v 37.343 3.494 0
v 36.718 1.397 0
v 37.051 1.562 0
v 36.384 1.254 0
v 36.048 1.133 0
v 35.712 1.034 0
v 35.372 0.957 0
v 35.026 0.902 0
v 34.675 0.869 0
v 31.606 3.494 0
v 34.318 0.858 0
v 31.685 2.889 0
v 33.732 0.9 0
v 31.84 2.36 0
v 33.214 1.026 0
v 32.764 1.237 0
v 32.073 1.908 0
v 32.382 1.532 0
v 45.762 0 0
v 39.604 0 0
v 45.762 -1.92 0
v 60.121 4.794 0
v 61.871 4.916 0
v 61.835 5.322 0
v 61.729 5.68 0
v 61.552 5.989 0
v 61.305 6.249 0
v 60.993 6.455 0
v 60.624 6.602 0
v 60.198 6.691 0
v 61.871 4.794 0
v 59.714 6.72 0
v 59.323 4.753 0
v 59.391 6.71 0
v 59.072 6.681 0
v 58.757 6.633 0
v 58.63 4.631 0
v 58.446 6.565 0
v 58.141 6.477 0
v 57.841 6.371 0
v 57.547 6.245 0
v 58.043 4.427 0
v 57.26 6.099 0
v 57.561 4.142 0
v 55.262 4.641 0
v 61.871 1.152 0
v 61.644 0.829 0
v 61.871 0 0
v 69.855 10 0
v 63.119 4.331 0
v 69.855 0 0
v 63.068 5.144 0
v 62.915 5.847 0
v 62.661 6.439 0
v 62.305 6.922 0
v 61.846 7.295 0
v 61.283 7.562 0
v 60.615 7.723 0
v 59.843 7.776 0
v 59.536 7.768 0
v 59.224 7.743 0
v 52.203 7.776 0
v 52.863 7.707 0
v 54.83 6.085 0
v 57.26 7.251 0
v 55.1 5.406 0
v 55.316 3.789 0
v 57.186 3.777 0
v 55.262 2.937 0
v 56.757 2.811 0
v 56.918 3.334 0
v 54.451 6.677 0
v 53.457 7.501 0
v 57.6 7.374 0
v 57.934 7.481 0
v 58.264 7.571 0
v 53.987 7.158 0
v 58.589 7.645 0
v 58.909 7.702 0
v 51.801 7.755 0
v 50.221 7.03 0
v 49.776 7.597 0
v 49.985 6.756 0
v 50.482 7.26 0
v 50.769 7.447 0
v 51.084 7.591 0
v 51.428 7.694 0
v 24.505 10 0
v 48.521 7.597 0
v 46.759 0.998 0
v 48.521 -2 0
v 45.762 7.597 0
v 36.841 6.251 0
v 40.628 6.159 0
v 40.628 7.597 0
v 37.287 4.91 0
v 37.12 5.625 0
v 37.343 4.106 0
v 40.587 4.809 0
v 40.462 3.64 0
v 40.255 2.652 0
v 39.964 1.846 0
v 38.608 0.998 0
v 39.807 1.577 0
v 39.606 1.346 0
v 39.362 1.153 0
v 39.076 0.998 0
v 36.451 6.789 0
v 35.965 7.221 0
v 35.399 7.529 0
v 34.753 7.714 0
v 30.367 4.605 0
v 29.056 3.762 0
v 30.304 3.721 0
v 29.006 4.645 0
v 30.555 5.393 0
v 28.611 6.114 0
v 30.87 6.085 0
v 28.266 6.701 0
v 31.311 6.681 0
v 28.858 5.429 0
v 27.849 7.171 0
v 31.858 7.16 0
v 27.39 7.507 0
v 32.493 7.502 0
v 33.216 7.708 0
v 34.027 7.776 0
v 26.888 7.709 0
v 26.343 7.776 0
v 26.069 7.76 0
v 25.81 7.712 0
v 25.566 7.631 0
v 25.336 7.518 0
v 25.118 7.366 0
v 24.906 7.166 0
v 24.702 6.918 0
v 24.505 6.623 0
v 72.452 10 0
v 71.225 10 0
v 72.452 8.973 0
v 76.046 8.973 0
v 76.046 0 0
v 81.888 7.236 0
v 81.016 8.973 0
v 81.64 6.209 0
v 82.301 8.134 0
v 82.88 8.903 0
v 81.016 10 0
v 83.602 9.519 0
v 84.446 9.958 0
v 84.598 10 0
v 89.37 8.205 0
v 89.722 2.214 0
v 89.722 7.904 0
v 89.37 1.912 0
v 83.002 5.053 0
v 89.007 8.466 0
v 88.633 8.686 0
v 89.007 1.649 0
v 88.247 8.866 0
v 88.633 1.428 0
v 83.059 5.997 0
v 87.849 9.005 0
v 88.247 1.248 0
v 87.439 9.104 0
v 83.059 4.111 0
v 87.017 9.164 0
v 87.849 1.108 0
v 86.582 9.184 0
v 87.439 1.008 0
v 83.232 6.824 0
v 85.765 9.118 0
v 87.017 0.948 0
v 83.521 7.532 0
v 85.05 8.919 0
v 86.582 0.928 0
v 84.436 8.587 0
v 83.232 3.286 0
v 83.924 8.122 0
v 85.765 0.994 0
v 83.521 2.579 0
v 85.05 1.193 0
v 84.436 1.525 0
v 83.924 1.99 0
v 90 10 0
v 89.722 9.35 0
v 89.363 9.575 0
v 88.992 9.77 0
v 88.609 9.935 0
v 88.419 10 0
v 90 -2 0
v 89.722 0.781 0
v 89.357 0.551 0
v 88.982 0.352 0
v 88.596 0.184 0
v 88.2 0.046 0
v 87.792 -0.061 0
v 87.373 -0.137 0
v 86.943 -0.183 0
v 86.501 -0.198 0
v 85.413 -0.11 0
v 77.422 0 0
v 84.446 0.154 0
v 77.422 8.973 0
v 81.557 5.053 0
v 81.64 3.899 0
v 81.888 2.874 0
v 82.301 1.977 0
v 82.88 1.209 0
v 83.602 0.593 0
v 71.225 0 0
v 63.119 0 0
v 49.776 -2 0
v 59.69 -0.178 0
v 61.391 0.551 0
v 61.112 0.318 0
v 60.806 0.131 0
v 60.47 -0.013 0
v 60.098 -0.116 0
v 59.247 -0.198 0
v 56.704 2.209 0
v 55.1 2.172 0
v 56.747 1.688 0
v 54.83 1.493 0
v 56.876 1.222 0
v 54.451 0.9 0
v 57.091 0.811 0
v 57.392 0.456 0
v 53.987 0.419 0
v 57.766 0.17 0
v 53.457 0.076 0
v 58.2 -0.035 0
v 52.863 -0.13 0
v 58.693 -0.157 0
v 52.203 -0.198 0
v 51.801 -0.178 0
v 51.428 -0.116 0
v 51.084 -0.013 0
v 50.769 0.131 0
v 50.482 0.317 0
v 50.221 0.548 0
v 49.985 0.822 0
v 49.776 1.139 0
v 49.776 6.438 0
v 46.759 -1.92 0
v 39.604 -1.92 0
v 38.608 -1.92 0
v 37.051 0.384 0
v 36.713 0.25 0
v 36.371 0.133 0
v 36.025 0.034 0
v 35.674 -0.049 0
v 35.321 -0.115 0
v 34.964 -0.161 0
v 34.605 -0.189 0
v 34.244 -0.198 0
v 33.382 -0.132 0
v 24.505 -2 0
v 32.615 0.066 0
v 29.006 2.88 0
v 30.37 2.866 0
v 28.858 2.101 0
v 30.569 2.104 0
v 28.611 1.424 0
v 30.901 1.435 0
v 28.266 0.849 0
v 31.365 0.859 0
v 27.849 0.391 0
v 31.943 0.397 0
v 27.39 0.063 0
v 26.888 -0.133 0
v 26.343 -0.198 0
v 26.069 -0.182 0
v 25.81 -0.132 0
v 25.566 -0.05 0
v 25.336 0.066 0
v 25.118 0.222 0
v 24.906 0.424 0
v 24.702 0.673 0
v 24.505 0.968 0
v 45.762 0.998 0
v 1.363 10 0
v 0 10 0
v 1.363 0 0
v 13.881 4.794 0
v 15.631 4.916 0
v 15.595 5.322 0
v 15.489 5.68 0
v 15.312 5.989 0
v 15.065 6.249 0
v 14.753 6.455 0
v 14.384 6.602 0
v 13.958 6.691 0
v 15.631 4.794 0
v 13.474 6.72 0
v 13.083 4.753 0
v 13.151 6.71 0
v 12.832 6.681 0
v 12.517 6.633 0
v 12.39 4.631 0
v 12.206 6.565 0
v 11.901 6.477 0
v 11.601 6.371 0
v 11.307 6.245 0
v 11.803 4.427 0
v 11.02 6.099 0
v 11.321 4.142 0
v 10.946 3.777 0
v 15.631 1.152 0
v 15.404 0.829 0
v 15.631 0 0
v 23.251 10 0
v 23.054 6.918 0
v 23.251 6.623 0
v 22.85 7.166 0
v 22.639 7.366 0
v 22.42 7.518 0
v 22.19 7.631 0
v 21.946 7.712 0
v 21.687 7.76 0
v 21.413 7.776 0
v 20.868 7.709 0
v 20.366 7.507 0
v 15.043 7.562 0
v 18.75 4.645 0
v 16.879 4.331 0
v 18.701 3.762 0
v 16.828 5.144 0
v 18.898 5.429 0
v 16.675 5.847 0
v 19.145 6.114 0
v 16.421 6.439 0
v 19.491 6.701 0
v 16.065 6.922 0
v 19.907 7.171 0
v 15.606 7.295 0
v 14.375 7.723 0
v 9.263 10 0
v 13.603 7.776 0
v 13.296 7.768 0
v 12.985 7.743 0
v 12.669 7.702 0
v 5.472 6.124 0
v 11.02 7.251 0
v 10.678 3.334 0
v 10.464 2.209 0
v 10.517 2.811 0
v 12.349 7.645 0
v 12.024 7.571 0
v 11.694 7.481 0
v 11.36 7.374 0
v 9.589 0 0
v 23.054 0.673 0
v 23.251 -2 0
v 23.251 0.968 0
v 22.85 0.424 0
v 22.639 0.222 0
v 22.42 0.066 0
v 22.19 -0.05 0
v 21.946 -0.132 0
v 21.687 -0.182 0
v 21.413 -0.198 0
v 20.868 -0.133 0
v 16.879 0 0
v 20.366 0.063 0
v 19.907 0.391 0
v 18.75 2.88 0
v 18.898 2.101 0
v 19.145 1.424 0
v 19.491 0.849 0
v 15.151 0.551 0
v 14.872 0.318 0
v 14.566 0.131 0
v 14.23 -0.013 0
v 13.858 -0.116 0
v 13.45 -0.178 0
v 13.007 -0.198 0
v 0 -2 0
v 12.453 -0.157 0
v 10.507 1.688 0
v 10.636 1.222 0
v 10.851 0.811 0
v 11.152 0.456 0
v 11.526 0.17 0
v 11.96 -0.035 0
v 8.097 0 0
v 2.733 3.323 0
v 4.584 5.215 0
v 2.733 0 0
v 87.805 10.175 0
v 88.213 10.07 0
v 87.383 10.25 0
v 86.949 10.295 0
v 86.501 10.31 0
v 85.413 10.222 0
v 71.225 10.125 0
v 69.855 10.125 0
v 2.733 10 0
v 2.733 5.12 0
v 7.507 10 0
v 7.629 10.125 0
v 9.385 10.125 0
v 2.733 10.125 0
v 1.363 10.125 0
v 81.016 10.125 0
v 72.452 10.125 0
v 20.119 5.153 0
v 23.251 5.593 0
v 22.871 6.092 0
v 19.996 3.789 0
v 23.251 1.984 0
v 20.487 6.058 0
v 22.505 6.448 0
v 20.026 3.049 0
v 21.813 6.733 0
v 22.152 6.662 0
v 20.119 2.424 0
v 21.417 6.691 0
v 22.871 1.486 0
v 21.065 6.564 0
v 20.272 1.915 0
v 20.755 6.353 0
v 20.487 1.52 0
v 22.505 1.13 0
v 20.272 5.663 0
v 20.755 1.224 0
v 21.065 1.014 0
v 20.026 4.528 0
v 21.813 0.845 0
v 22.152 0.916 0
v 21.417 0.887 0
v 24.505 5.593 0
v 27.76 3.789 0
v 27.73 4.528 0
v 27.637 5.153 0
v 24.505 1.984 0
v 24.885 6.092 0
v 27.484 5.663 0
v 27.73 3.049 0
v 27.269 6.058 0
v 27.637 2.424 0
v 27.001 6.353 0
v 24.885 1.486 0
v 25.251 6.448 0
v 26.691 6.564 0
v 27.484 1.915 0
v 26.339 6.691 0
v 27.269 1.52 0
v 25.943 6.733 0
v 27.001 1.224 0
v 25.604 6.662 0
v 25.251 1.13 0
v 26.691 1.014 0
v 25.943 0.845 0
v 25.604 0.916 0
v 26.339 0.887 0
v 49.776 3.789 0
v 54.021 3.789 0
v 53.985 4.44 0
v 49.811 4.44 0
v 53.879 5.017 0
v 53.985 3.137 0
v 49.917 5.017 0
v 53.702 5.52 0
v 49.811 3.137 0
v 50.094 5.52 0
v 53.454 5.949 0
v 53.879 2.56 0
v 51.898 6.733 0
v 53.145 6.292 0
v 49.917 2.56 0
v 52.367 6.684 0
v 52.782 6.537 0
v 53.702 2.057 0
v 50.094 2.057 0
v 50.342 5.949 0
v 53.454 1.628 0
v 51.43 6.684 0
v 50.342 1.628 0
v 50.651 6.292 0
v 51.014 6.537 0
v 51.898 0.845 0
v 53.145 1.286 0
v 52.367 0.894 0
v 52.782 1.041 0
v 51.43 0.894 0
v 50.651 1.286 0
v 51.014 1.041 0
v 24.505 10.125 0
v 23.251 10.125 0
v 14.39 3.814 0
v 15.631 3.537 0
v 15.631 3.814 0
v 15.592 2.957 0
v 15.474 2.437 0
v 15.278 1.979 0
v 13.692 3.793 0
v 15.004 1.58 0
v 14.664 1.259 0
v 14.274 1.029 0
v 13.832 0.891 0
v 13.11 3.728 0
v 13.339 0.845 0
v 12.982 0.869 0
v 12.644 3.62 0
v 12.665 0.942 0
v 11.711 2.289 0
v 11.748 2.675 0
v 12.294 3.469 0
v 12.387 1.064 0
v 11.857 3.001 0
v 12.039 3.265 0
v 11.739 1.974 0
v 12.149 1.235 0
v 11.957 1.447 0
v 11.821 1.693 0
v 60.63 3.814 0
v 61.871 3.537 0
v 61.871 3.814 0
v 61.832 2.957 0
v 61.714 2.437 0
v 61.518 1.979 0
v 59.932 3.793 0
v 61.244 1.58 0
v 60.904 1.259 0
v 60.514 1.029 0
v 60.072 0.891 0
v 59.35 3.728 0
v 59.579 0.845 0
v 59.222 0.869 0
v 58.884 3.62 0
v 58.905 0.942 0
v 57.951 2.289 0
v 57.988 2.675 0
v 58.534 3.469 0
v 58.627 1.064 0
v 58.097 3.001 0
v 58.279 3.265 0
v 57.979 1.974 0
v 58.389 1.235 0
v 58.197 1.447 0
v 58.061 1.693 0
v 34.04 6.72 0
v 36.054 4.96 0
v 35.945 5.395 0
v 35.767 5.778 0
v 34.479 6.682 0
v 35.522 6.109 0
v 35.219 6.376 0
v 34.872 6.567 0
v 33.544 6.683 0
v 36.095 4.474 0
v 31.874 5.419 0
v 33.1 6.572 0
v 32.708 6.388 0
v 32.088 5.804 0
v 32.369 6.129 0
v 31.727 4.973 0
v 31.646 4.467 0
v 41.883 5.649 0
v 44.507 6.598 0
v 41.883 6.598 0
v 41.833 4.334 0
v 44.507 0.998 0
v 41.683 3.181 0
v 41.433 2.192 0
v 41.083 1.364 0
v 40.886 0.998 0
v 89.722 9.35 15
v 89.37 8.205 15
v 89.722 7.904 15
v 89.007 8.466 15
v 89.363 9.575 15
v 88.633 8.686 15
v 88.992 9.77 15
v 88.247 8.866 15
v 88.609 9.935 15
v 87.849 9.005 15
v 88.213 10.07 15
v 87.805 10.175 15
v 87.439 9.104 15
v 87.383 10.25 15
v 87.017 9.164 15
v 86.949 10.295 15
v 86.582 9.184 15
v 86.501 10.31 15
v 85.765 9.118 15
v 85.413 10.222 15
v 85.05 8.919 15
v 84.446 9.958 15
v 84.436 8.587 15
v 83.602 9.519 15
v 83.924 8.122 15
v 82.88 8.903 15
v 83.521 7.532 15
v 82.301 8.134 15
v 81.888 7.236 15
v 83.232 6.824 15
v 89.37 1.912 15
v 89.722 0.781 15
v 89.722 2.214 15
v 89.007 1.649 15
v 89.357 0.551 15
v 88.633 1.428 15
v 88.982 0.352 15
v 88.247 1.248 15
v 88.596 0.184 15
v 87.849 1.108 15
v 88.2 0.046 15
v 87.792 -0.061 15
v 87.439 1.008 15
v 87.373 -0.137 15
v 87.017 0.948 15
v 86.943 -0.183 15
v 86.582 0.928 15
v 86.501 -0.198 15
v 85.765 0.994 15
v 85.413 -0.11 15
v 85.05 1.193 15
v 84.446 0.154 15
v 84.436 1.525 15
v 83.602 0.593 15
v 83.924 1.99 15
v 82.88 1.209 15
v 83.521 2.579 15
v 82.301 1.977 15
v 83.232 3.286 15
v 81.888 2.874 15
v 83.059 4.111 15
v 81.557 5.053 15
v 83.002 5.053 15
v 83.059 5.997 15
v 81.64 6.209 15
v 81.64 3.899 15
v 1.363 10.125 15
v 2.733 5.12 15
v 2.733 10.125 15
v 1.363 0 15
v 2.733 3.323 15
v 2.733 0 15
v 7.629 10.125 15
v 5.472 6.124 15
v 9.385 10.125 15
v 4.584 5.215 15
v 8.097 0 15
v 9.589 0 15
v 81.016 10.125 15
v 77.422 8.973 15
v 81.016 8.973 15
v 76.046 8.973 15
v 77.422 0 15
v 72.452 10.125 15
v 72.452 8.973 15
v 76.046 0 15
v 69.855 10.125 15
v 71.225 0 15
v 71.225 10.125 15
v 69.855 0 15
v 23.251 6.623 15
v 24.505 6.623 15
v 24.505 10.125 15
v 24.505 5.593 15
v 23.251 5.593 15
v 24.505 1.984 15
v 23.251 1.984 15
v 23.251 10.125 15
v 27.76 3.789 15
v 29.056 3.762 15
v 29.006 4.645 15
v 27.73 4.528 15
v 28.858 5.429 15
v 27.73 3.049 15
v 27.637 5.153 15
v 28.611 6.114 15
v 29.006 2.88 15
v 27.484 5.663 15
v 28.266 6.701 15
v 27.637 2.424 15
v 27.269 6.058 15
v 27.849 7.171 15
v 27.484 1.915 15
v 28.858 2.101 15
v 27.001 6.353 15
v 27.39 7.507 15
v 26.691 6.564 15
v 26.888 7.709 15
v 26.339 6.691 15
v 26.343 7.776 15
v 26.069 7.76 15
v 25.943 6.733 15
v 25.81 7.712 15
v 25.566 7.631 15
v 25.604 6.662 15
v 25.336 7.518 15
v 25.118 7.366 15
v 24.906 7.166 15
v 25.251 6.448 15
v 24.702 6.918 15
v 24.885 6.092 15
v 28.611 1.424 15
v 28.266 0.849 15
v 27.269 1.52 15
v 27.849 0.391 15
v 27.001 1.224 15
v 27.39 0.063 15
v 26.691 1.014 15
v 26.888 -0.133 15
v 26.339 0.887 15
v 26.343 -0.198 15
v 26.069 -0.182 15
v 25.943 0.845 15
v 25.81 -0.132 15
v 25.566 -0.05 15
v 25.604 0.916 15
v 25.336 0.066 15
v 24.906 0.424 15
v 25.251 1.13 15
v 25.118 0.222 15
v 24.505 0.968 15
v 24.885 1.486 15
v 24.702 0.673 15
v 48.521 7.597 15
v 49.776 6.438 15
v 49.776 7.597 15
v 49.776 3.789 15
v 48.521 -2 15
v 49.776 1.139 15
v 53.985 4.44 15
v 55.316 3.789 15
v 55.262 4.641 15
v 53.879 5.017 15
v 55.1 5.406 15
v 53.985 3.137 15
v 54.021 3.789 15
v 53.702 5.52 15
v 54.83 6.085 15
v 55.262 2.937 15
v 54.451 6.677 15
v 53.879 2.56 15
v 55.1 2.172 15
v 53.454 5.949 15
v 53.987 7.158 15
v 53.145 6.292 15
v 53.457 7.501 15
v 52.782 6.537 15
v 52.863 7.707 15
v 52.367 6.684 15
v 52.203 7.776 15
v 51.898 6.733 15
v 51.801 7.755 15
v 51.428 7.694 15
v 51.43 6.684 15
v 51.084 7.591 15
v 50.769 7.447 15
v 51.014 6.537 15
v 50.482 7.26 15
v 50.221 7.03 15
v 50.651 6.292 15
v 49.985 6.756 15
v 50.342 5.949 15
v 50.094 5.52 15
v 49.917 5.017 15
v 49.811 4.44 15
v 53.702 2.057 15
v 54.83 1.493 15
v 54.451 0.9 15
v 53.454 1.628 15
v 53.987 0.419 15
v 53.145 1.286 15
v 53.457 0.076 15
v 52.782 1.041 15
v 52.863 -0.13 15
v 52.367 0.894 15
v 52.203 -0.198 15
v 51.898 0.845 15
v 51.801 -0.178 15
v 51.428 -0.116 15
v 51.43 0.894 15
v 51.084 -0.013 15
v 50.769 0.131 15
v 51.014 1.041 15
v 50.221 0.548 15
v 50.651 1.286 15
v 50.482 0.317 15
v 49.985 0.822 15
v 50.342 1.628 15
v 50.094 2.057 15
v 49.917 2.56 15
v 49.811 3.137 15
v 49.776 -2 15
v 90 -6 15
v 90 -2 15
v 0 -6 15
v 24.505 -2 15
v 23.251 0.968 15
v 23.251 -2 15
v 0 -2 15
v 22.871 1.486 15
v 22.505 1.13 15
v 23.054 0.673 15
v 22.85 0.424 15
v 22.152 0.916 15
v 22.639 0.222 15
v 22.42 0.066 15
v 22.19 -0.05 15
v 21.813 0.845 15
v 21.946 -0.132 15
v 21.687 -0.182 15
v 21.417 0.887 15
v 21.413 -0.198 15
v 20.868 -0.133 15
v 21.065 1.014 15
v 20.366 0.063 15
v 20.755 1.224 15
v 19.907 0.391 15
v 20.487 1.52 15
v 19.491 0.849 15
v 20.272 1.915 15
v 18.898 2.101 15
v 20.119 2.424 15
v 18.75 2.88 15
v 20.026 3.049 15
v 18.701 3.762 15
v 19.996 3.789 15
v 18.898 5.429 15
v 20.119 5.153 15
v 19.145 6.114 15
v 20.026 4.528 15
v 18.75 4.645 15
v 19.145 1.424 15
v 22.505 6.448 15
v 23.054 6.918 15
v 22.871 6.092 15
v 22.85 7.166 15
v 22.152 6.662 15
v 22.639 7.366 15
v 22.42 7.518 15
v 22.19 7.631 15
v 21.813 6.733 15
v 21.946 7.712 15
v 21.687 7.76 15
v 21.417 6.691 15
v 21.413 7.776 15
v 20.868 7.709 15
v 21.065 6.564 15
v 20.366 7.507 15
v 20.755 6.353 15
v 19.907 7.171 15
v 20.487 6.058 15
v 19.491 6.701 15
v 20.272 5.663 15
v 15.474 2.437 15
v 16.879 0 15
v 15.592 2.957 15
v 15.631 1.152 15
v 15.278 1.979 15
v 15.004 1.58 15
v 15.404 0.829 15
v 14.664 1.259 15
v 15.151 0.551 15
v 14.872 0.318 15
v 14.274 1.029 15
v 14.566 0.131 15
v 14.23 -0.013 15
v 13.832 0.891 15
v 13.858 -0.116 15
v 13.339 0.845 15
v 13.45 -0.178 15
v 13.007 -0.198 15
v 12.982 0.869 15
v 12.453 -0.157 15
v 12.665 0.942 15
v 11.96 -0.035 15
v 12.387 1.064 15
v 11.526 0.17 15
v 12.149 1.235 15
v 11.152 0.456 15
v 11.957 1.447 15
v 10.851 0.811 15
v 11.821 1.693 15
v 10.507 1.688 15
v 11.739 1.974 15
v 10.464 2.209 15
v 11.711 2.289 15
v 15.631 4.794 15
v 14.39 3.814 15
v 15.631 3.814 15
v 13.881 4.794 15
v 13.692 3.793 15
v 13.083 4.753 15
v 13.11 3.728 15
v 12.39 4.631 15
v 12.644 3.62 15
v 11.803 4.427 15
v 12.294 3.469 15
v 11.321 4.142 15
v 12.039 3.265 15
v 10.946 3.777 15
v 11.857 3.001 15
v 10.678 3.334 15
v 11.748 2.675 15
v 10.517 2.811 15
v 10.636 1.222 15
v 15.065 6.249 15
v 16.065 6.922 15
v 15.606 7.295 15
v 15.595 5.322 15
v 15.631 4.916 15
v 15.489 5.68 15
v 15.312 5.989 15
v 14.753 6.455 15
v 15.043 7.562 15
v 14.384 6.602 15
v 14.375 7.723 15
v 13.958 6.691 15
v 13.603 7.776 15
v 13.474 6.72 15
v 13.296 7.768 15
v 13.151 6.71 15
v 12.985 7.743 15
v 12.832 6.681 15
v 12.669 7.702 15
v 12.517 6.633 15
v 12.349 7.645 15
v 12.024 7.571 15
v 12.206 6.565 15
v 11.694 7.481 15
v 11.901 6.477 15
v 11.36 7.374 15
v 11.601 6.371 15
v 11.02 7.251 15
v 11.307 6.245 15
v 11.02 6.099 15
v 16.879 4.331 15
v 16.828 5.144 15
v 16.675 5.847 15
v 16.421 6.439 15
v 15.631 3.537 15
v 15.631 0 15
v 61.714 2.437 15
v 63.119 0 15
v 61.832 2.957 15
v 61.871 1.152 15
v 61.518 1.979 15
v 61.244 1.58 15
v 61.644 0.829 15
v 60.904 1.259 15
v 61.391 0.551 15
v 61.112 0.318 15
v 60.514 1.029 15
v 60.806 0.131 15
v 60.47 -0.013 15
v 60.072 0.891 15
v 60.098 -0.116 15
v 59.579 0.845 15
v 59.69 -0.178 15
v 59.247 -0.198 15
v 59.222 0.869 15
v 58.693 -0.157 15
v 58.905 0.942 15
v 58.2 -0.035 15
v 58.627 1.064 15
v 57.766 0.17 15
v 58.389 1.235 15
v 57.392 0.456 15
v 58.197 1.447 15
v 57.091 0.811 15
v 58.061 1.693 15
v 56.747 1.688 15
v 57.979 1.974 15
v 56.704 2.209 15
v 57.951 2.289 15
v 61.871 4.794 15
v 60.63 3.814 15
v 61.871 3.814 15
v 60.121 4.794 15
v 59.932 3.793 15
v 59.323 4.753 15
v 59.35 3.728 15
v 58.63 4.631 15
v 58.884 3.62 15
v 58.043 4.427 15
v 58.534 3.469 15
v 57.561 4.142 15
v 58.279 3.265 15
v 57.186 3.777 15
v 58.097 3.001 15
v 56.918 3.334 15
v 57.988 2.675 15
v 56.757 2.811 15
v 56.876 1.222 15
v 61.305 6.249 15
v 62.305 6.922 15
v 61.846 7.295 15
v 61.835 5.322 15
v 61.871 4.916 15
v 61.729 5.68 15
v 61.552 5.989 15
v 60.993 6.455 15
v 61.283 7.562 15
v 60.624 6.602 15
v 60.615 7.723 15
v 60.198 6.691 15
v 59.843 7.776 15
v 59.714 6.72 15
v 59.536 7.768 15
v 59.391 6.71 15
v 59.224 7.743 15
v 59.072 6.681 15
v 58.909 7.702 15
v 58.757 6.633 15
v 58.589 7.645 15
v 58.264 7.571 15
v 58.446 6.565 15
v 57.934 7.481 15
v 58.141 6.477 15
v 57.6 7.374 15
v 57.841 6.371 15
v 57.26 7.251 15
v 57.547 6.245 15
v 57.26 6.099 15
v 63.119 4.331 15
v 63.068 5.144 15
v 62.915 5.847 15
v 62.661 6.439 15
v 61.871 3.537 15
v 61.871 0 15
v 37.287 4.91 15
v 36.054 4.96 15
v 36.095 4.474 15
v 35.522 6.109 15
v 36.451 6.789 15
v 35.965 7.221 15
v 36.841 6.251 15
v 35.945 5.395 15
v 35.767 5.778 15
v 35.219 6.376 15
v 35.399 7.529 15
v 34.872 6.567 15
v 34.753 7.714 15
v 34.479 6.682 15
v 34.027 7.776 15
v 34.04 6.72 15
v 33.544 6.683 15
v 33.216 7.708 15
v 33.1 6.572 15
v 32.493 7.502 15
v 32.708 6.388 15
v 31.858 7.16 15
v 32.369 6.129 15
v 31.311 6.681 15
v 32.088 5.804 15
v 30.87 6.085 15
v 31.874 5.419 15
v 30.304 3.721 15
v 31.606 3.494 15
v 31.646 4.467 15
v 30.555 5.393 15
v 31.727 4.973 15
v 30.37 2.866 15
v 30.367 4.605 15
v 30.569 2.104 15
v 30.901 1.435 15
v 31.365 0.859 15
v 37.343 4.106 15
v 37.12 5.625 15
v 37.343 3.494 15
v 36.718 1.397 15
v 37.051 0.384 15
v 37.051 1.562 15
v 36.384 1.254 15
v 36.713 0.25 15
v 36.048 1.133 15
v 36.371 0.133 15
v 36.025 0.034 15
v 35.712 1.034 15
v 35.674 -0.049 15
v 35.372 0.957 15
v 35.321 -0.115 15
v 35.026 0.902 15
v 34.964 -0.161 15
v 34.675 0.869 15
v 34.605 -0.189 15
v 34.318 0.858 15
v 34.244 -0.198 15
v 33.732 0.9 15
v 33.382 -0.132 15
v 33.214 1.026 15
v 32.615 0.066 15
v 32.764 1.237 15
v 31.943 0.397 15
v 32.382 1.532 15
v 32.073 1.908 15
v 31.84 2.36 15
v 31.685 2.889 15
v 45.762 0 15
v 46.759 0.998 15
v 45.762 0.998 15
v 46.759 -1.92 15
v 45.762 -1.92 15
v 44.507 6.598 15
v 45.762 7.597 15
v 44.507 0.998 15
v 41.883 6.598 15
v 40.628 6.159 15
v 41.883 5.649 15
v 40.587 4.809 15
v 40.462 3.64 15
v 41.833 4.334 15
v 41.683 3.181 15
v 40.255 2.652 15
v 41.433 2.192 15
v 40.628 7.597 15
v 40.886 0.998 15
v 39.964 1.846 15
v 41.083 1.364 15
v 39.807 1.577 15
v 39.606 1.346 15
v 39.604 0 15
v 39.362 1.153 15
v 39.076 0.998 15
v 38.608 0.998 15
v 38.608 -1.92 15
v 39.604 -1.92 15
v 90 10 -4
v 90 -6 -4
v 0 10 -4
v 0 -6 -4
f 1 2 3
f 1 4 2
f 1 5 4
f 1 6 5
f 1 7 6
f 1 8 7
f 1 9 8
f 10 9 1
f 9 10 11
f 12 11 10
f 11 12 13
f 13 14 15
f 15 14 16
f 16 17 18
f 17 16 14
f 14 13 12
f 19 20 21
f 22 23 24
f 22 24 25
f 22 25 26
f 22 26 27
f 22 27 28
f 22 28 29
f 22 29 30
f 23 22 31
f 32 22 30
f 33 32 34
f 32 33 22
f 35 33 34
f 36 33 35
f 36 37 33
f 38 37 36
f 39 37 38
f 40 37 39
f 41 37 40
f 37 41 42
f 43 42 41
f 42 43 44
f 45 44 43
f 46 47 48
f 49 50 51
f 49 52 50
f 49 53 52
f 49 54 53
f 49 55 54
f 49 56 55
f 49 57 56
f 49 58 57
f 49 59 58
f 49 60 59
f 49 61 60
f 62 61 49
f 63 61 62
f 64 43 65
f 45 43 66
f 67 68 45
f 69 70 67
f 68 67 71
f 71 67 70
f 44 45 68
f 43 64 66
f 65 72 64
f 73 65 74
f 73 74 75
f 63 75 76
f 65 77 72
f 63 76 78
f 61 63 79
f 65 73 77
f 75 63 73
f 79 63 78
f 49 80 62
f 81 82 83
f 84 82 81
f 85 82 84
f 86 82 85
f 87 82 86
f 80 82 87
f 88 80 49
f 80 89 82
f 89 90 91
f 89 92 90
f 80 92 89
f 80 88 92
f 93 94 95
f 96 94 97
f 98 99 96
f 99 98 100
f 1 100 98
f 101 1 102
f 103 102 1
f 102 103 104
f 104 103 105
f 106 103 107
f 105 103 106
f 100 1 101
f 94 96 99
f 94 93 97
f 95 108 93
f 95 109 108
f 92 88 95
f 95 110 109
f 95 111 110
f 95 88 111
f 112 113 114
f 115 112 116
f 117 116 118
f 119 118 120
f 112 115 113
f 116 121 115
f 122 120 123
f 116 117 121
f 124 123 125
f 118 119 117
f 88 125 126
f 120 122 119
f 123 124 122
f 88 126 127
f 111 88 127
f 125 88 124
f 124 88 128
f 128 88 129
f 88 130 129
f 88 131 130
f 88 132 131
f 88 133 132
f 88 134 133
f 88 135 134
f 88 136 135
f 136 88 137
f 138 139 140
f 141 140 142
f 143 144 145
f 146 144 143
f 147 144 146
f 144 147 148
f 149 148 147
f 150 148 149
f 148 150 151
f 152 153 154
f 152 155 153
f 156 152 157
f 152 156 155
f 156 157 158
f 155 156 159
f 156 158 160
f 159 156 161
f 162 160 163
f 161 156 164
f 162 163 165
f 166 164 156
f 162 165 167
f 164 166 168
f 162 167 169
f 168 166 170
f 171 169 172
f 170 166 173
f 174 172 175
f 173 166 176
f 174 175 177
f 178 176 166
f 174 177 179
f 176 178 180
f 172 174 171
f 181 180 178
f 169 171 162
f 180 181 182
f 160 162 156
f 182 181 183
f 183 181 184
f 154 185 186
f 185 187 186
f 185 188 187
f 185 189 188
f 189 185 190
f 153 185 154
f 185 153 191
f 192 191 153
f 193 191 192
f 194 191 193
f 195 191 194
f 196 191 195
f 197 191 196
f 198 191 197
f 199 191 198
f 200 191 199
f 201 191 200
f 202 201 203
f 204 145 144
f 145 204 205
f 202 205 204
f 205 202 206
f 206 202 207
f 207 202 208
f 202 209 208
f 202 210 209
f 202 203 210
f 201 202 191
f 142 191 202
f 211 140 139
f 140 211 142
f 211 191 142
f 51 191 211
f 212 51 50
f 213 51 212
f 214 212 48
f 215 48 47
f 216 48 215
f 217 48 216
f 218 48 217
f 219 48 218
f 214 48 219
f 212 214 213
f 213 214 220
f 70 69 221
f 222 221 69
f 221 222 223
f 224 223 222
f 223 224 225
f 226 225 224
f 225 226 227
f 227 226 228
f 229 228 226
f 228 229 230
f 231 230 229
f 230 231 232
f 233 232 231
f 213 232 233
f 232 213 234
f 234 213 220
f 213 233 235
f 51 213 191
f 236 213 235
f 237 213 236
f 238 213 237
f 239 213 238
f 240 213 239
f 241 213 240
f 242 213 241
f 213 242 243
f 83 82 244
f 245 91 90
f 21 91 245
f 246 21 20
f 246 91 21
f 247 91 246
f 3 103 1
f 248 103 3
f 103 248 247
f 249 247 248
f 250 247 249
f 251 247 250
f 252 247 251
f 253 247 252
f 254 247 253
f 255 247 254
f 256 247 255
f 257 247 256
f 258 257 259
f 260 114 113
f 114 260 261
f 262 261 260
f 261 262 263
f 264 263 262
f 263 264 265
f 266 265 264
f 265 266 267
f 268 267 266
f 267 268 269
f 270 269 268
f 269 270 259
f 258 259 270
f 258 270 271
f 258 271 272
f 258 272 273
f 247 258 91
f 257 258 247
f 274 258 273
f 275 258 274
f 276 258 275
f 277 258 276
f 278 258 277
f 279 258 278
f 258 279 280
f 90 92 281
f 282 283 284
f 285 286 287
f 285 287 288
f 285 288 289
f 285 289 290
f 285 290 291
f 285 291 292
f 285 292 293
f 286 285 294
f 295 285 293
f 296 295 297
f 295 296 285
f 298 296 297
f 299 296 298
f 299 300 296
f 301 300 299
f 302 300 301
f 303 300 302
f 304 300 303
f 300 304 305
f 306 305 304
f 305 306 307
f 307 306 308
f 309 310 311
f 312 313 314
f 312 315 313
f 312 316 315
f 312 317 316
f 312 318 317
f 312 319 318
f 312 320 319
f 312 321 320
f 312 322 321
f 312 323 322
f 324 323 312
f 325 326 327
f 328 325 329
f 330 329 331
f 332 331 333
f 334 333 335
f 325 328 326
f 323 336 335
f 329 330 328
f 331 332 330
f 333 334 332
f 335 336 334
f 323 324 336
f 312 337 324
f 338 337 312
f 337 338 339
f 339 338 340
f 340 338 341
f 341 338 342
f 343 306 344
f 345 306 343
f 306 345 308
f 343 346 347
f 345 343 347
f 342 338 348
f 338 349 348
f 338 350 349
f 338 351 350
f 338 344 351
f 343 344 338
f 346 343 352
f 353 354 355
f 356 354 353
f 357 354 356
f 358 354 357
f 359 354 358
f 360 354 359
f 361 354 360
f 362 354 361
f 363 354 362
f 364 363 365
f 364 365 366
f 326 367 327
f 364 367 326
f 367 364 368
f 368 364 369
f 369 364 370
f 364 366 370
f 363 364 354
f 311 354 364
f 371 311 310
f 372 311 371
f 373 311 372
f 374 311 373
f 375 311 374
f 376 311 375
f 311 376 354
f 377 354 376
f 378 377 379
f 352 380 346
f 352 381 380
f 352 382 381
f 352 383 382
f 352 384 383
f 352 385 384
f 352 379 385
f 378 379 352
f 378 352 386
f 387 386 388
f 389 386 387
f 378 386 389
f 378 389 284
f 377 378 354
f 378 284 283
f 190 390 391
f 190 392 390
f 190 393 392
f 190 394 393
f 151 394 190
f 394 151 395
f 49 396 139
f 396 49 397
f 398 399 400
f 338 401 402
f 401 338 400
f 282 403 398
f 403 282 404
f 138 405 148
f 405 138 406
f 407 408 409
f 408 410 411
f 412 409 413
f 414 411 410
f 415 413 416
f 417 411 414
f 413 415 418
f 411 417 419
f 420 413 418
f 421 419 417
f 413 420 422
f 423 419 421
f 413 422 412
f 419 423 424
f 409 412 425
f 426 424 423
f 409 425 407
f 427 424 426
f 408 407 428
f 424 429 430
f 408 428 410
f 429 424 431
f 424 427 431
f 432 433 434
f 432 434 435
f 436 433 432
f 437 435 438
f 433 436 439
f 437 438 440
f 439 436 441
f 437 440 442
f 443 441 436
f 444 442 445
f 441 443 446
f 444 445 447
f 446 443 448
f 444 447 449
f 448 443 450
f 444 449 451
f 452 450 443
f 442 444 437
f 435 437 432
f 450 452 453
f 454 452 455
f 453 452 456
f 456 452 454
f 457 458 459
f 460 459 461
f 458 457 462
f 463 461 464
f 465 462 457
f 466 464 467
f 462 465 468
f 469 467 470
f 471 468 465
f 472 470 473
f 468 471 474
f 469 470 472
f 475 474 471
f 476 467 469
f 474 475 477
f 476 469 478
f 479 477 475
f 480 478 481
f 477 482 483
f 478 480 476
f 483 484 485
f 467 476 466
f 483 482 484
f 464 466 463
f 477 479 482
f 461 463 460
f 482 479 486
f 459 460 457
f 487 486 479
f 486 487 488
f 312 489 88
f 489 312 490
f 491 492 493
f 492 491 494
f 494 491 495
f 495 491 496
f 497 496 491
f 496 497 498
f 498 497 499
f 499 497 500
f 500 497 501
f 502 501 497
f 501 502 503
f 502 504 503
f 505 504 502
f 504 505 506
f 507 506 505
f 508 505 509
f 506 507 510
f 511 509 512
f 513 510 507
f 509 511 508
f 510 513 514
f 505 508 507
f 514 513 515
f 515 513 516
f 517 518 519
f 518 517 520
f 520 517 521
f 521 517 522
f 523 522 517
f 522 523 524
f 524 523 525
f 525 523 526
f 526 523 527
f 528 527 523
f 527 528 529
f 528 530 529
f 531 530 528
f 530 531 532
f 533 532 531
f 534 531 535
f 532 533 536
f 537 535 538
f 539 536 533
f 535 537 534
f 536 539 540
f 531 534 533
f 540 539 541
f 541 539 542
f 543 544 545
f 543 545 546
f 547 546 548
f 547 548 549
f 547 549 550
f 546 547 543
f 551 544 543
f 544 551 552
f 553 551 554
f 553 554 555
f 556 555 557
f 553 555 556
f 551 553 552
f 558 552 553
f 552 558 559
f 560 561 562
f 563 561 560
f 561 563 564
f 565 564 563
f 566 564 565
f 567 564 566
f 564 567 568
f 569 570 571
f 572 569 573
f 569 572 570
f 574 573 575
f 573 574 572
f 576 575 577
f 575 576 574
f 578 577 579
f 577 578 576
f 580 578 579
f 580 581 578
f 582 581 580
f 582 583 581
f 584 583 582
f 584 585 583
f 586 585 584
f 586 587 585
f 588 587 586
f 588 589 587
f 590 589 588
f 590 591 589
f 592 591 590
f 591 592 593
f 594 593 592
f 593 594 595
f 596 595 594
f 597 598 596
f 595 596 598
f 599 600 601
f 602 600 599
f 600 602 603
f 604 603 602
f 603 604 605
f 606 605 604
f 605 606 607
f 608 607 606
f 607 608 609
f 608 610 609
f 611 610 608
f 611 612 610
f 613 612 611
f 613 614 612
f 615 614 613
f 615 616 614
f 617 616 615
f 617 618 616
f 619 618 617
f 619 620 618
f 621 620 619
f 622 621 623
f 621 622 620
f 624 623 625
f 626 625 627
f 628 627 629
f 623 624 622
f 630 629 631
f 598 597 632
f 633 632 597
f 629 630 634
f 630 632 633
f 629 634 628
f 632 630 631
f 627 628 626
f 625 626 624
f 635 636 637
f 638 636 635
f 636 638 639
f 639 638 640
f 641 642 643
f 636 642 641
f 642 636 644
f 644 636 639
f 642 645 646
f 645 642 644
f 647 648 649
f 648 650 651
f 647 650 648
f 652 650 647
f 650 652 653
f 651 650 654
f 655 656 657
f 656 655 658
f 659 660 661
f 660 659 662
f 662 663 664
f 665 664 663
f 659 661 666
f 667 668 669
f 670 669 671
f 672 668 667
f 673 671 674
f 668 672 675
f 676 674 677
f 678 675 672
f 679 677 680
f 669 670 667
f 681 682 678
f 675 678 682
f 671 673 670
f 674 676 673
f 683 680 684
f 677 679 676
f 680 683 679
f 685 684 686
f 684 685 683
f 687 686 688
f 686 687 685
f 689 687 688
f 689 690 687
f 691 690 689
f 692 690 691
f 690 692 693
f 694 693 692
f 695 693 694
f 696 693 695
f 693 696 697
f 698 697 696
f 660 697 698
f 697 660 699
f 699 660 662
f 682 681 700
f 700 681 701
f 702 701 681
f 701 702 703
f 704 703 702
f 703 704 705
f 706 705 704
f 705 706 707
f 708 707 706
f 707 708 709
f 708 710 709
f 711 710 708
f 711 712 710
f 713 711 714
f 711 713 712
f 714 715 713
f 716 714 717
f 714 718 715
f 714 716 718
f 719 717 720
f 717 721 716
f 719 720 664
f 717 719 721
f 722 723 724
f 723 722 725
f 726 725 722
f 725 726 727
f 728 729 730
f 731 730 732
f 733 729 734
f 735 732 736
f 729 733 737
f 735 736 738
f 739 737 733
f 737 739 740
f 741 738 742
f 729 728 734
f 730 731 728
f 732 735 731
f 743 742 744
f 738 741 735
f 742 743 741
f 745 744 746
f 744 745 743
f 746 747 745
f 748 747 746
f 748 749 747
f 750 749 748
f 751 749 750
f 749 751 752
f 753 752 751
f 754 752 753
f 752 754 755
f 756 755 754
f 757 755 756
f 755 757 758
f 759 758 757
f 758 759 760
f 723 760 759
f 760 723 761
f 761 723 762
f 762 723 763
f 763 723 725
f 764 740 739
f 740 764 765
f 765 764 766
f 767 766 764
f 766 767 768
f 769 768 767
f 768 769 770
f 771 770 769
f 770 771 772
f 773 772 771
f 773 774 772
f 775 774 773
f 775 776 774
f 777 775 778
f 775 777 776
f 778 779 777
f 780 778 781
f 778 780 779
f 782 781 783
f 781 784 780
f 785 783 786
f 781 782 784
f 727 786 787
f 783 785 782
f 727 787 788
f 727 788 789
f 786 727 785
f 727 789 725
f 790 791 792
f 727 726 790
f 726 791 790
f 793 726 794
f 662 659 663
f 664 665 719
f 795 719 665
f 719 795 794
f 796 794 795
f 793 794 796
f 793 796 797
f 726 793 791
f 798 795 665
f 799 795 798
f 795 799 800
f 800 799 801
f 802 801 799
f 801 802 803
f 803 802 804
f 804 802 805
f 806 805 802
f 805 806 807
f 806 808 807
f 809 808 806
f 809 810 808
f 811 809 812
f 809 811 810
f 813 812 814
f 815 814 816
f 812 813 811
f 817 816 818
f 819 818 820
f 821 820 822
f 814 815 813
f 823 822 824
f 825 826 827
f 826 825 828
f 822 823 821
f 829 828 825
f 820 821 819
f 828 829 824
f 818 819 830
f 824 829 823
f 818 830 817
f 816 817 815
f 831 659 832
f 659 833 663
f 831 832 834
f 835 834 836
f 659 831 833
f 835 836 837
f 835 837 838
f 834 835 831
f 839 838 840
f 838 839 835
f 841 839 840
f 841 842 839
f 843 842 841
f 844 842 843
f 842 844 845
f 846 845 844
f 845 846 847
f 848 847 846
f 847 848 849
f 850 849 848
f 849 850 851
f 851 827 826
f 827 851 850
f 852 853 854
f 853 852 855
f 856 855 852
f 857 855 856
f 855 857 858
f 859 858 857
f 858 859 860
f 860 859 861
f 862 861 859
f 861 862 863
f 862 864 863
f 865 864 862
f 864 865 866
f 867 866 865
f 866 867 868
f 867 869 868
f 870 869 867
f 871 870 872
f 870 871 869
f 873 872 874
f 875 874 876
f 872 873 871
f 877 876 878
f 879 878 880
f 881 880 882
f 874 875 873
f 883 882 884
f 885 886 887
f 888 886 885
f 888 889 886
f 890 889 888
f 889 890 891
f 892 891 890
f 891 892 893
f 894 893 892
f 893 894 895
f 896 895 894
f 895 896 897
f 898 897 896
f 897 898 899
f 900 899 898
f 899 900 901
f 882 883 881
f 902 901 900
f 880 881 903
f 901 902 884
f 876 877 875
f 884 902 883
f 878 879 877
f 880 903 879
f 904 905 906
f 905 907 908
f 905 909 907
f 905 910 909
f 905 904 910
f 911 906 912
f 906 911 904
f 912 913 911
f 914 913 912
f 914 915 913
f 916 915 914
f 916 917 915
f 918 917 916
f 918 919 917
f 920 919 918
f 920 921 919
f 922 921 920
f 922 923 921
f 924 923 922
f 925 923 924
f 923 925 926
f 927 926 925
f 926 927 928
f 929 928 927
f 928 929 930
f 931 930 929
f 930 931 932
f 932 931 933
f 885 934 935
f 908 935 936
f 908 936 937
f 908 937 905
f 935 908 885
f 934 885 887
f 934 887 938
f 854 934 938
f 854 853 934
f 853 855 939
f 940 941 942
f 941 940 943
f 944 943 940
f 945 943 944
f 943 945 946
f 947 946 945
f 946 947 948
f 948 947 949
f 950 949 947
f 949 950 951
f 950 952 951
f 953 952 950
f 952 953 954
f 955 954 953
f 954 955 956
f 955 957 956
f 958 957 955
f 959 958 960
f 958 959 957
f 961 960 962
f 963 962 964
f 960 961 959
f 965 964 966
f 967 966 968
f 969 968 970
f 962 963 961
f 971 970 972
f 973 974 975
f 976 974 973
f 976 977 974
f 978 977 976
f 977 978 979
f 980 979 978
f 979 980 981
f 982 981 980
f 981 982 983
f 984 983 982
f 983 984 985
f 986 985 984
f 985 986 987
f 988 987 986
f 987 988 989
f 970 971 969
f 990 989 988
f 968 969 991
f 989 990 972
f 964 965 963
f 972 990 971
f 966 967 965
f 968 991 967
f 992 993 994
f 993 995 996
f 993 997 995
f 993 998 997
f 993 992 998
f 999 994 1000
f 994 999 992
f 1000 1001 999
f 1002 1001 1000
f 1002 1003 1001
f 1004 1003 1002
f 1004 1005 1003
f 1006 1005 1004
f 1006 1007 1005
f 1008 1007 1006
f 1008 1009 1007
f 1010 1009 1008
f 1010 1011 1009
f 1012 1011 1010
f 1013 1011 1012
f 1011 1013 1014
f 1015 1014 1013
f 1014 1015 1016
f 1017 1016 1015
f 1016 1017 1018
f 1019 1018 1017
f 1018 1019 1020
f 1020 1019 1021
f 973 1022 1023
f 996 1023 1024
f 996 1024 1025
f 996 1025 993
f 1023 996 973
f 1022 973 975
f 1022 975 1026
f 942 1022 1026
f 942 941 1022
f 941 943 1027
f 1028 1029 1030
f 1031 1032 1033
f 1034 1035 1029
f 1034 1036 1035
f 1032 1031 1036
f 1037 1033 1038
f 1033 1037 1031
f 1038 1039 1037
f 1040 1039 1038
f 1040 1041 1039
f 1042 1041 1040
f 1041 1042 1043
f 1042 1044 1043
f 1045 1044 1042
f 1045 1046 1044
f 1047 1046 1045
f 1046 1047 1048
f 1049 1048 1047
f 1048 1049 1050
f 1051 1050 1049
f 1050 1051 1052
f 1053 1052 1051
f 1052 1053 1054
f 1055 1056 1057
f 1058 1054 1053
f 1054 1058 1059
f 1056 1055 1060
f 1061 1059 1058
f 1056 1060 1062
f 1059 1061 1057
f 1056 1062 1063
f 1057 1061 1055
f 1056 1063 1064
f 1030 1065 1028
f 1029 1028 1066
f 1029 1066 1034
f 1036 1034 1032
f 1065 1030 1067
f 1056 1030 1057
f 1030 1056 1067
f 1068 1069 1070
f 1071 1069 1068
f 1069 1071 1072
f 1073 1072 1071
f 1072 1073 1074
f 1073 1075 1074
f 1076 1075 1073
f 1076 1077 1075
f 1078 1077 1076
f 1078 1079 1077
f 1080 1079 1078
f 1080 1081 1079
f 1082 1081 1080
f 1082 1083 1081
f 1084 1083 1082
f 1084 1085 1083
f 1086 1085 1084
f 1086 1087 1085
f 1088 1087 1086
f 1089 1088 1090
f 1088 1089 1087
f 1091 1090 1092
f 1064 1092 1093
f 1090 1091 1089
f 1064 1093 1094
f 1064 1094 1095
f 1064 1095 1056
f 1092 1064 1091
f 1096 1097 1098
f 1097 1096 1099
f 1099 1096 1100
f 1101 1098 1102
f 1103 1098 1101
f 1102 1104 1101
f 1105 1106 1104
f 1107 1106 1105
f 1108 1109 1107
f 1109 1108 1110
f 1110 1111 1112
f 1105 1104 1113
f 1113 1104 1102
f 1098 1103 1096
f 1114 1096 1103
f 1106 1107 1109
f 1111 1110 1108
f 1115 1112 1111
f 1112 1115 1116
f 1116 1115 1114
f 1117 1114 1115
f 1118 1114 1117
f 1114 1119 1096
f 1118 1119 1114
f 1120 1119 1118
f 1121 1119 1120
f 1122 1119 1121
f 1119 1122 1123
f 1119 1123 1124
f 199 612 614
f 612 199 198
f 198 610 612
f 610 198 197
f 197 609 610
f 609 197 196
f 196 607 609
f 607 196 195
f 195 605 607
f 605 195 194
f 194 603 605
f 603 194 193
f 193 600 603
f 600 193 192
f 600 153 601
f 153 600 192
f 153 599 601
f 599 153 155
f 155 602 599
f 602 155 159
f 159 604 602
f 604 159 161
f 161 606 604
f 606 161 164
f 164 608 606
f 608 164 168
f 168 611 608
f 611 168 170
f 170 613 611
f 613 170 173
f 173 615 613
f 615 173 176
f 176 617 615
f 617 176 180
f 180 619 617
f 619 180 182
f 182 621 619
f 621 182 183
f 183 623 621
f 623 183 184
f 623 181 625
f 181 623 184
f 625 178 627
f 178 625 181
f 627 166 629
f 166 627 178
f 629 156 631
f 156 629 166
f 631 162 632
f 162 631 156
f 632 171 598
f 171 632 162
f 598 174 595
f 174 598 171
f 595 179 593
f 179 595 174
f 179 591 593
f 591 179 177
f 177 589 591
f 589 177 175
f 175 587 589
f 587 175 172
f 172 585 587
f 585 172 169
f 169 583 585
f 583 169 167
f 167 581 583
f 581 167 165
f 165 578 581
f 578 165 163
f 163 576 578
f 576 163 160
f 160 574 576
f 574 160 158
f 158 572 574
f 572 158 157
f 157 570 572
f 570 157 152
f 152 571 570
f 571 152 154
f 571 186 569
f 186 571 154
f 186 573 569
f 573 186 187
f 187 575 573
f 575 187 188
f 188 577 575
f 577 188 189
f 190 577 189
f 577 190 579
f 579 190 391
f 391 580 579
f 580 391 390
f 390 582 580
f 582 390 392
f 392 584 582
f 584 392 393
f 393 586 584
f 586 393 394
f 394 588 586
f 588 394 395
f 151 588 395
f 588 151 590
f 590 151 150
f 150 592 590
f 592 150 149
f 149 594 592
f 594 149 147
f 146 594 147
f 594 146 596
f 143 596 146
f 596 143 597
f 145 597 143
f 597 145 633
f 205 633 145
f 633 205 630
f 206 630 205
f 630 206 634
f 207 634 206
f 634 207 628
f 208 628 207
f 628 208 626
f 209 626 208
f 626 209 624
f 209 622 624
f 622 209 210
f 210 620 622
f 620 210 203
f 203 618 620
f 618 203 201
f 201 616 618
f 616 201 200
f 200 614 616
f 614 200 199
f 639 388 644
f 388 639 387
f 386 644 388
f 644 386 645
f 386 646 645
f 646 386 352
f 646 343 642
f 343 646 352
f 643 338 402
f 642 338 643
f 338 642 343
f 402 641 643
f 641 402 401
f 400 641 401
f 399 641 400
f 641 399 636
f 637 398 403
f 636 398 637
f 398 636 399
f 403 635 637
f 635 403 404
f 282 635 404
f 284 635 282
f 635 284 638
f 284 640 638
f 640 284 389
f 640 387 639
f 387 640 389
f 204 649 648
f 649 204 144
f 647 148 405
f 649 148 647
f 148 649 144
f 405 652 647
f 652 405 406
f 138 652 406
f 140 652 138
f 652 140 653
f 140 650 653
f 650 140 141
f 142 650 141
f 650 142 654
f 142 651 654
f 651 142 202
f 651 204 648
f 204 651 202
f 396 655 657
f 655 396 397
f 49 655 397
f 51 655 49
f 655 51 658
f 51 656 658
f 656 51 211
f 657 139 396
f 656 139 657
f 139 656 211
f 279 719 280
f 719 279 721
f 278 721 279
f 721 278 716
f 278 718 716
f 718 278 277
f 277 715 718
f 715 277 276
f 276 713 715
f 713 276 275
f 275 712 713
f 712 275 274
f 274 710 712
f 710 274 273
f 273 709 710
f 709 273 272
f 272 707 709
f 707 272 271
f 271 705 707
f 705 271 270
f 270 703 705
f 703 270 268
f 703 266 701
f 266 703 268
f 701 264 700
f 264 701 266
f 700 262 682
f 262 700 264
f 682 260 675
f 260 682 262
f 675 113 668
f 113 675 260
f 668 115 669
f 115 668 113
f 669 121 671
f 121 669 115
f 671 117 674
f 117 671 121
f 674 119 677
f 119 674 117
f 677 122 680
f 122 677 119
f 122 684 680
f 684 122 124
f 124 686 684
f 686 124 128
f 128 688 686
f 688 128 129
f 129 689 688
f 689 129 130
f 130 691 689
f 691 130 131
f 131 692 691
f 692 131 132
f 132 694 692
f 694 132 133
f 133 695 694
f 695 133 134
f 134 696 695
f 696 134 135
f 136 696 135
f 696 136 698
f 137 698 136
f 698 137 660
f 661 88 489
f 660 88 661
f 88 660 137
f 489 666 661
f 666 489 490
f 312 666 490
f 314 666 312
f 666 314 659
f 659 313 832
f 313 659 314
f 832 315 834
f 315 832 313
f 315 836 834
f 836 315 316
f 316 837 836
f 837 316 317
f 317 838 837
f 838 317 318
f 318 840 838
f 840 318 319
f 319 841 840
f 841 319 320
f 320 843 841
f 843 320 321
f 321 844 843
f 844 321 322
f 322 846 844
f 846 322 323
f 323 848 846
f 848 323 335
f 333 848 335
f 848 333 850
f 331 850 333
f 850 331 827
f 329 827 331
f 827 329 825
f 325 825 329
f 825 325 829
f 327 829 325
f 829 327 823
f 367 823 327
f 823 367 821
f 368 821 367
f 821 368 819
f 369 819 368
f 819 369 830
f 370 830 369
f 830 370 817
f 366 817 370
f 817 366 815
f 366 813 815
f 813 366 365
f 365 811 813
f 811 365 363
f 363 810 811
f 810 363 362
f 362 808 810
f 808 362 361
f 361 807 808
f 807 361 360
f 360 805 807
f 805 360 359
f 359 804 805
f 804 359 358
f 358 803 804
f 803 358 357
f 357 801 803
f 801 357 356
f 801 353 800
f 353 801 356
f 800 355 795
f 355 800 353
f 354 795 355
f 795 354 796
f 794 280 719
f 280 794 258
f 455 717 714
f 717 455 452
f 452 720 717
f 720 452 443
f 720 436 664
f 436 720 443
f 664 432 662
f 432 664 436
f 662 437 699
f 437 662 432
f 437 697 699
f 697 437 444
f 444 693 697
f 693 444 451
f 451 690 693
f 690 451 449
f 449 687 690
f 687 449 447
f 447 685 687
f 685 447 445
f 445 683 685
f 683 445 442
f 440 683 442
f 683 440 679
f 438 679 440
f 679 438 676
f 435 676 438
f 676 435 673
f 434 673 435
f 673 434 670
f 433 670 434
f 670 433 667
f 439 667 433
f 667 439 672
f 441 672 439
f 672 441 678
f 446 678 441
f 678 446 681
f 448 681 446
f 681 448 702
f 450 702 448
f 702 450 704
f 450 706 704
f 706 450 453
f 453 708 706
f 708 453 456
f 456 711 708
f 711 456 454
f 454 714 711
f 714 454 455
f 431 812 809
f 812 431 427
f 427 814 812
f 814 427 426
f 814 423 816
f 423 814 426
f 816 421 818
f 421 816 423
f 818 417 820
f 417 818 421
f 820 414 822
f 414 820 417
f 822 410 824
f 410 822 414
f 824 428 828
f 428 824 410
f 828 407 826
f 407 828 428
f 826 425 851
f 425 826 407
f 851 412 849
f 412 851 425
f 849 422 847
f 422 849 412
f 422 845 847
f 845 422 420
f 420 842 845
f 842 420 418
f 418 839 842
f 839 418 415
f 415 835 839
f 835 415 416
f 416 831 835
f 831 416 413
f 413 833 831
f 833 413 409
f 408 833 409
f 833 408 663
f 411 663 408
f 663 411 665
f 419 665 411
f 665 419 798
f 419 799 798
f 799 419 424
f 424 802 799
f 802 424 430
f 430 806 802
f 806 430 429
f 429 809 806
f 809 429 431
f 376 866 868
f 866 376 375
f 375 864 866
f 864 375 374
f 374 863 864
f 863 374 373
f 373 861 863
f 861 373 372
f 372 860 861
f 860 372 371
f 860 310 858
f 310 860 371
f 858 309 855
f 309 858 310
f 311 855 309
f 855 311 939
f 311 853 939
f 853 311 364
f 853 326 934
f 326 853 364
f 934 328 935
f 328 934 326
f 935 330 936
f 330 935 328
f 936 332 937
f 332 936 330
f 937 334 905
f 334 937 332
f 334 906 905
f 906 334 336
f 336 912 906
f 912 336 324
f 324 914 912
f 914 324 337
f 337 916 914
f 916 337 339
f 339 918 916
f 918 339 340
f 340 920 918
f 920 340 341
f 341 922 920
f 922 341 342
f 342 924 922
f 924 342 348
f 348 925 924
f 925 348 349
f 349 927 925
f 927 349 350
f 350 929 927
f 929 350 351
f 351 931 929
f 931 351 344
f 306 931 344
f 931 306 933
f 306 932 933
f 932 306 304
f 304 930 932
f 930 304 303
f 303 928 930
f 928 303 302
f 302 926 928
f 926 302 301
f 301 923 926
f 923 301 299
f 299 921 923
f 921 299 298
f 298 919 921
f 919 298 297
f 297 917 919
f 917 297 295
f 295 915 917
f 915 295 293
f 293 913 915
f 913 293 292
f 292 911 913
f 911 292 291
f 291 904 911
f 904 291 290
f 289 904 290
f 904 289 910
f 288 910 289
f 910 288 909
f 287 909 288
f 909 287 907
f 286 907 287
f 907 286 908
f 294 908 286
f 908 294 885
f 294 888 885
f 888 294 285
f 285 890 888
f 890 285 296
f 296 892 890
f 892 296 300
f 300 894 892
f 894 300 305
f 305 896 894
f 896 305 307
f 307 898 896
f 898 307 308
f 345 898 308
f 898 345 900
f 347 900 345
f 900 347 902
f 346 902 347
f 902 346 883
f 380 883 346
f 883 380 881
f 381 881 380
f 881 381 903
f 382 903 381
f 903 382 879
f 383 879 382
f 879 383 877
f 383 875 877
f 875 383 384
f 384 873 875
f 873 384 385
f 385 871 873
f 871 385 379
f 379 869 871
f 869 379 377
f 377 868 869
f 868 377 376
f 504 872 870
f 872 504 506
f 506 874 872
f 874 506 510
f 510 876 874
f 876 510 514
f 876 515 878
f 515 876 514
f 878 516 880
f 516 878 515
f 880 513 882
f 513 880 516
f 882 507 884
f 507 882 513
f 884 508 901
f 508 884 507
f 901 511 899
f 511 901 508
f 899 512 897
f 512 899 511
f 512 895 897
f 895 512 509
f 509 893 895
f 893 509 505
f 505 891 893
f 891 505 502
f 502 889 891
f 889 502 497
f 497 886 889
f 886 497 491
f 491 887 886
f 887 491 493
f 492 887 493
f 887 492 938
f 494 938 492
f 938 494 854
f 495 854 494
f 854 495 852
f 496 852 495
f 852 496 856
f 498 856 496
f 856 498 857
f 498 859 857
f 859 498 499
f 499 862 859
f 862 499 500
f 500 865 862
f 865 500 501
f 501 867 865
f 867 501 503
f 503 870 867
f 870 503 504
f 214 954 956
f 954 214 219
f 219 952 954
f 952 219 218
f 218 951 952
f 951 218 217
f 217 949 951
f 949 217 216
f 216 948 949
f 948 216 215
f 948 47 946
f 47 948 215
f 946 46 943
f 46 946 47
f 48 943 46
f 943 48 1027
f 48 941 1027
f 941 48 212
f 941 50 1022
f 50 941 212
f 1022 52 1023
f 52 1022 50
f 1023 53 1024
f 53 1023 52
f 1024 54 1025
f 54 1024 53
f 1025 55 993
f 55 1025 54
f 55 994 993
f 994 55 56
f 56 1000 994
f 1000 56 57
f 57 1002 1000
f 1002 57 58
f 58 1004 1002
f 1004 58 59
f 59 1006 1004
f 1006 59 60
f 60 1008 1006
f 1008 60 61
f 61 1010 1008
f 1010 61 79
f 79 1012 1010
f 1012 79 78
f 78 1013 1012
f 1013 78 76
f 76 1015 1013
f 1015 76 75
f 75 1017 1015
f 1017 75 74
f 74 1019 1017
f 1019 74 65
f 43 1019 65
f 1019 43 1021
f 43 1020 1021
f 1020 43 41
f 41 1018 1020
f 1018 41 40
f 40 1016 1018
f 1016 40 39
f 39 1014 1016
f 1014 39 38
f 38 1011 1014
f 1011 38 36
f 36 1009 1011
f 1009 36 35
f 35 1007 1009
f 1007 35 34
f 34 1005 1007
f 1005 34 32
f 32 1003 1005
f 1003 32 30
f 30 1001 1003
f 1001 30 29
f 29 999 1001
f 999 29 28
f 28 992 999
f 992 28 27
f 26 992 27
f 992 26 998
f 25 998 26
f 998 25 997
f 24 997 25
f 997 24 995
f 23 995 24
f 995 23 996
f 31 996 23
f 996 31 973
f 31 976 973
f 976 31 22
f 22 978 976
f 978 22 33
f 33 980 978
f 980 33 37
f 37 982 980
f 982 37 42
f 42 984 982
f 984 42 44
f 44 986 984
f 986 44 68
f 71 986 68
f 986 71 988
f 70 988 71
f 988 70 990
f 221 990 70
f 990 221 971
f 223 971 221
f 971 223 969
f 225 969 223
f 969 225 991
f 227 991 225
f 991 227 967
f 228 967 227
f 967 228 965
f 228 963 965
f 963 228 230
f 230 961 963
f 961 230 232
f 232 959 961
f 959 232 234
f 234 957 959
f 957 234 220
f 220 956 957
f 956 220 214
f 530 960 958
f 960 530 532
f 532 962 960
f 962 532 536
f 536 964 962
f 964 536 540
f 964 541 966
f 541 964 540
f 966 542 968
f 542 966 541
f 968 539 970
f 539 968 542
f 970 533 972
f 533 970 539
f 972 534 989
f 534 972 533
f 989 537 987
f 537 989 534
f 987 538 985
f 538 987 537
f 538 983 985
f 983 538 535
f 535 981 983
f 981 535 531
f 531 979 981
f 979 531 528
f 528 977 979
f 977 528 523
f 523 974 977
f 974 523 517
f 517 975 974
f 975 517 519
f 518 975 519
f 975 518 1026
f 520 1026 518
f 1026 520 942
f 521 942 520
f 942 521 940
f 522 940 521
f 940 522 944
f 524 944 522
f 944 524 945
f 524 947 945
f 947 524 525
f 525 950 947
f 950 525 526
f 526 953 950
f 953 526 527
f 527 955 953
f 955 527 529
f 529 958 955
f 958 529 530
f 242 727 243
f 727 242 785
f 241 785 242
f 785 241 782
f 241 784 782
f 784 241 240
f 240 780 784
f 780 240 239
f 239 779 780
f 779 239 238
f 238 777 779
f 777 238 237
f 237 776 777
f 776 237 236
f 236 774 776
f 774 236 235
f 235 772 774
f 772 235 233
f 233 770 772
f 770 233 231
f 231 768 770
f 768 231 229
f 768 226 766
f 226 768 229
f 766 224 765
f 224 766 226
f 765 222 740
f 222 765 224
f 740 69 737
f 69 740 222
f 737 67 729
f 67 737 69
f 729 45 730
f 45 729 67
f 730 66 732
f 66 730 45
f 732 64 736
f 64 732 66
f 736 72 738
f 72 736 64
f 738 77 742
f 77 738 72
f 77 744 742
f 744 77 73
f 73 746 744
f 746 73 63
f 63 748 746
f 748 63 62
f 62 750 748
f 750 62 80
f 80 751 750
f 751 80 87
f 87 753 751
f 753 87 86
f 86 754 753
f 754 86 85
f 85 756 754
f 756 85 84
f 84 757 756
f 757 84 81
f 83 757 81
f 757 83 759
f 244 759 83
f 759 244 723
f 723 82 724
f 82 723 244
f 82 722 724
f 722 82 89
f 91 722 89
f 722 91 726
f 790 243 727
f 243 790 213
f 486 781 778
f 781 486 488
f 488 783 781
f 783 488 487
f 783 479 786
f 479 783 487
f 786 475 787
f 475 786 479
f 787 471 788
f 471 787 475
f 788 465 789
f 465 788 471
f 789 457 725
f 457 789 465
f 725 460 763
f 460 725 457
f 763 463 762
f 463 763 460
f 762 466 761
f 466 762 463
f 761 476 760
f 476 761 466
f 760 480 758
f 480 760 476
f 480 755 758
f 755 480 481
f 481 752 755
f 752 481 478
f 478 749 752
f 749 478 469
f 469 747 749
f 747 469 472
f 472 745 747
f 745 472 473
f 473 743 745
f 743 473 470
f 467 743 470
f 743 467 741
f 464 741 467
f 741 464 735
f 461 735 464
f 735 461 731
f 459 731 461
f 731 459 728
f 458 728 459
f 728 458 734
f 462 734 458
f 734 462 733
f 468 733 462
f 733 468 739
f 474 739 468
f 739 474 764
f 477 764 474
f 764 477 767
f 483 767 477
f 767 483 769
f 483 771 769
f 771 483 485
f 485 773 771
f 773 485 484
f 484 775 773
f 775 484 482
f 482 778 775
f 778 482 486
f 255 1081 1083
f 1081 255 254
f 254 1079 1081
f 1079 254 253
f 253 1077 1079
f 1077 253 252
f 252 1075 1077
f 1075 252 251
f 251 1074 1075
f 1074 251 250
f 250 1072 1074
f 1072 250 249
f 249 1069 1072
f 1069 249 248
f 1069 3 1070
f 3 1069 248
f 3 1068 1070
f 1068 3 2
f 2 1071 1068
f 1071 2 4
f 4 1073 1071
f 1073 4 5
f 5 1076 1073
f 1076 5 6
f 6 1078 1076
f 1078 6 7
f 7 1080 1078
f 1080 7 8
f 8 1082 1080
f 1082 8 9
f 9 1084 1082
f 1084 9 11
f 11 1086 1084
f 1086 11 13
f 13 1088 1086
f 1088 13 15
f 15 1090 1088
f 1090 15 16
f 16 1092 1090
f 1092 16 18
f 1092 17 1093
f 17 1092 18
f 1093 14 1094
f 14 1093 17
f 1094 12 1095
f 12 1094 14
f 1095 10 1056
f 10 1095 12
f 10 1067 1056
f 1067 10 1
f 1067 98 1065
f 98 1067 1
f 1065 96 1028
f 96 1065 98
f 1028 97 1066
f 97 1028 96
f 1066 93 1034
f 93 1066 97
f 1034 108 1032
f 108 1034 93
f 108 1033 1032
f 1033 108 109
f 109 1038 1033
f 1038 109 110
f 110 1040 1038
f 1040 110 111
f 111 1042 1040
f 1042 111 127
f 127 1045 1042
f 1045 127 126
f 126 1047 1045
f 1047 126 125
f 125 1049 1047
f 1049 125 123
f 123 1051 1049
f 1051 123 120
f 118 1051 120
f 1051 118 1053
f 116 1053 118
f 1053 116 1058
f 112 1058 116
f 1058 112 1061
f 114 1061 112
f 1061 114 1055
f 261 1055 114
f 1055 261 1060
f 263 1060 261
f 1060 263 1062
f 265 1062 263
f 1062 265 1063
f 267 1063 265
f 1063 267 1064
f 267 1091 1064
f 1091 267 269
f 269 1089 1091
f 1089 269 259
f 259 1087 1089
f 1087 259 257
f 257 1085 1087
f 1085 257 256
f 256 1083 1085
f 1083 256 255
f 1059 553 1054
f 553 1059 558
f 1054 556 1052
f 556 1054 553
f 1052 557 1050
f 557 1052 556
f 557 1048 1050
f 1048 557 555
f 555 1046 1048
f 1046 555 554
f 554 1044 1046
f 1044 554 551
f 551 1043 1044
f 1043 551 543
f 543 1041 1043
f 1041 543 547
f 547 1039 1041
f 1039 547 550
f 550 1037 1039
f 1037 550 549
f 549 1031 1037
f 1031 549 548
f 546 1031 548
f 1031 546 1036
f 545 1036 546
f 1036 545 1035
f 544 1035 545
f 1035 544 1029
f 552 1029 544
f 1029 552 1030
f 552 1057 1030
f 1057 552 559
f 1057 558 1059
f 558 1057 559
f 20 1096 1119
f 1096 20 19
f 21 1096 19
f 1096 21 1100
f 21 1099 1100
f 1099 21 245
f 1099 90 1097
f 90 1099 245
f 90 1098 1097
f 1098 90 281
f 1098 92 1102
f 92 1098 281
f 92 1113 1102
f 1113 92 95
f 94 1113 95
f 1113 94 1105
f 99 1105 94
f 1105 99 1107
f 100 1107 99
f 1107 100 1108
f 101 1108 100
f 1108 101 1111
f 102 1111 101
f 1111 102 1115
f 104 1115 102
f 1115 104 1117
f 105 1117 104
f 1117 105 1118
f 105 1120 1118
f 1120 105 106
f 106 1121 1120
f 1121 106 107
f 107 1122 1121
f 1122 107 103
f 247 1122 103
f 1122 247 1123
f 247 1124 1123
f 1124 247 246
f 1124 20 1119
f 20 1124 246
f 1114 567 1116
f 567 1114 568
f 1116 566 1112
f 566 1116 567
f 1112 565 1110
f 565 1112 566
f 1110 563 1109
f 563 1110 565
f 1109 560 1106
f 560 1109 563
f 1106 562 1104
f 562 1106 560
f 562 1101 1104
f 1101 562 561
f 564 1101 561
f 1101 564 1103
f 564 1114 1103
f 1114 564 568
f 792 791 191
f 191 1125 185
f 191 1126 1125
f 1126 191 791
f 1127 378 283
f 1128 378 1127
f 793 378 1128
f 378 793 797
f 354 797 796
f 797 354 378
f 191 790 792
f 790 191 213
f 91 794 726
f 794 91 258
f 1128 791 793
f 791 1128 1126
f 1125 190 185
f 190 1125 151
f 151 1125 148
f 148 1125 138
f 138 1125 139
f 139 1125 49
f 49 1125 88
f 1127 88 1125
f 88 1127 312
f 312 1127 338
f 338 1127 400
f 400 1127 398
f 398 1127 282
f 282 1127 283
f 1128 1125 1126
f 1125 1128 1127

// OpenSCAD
linear_extrude(height=15, convexity = 10){
    
text(text="Кафедра ITC",
     language="ua",
     font="Segoe Script:style=Book",
     $fn=30);
    
}

translate([0,-6,0]) cube([90,4,15]);

translate([0,-6,0])
rotate([-90,0,0]) cube([90,4,16]);
